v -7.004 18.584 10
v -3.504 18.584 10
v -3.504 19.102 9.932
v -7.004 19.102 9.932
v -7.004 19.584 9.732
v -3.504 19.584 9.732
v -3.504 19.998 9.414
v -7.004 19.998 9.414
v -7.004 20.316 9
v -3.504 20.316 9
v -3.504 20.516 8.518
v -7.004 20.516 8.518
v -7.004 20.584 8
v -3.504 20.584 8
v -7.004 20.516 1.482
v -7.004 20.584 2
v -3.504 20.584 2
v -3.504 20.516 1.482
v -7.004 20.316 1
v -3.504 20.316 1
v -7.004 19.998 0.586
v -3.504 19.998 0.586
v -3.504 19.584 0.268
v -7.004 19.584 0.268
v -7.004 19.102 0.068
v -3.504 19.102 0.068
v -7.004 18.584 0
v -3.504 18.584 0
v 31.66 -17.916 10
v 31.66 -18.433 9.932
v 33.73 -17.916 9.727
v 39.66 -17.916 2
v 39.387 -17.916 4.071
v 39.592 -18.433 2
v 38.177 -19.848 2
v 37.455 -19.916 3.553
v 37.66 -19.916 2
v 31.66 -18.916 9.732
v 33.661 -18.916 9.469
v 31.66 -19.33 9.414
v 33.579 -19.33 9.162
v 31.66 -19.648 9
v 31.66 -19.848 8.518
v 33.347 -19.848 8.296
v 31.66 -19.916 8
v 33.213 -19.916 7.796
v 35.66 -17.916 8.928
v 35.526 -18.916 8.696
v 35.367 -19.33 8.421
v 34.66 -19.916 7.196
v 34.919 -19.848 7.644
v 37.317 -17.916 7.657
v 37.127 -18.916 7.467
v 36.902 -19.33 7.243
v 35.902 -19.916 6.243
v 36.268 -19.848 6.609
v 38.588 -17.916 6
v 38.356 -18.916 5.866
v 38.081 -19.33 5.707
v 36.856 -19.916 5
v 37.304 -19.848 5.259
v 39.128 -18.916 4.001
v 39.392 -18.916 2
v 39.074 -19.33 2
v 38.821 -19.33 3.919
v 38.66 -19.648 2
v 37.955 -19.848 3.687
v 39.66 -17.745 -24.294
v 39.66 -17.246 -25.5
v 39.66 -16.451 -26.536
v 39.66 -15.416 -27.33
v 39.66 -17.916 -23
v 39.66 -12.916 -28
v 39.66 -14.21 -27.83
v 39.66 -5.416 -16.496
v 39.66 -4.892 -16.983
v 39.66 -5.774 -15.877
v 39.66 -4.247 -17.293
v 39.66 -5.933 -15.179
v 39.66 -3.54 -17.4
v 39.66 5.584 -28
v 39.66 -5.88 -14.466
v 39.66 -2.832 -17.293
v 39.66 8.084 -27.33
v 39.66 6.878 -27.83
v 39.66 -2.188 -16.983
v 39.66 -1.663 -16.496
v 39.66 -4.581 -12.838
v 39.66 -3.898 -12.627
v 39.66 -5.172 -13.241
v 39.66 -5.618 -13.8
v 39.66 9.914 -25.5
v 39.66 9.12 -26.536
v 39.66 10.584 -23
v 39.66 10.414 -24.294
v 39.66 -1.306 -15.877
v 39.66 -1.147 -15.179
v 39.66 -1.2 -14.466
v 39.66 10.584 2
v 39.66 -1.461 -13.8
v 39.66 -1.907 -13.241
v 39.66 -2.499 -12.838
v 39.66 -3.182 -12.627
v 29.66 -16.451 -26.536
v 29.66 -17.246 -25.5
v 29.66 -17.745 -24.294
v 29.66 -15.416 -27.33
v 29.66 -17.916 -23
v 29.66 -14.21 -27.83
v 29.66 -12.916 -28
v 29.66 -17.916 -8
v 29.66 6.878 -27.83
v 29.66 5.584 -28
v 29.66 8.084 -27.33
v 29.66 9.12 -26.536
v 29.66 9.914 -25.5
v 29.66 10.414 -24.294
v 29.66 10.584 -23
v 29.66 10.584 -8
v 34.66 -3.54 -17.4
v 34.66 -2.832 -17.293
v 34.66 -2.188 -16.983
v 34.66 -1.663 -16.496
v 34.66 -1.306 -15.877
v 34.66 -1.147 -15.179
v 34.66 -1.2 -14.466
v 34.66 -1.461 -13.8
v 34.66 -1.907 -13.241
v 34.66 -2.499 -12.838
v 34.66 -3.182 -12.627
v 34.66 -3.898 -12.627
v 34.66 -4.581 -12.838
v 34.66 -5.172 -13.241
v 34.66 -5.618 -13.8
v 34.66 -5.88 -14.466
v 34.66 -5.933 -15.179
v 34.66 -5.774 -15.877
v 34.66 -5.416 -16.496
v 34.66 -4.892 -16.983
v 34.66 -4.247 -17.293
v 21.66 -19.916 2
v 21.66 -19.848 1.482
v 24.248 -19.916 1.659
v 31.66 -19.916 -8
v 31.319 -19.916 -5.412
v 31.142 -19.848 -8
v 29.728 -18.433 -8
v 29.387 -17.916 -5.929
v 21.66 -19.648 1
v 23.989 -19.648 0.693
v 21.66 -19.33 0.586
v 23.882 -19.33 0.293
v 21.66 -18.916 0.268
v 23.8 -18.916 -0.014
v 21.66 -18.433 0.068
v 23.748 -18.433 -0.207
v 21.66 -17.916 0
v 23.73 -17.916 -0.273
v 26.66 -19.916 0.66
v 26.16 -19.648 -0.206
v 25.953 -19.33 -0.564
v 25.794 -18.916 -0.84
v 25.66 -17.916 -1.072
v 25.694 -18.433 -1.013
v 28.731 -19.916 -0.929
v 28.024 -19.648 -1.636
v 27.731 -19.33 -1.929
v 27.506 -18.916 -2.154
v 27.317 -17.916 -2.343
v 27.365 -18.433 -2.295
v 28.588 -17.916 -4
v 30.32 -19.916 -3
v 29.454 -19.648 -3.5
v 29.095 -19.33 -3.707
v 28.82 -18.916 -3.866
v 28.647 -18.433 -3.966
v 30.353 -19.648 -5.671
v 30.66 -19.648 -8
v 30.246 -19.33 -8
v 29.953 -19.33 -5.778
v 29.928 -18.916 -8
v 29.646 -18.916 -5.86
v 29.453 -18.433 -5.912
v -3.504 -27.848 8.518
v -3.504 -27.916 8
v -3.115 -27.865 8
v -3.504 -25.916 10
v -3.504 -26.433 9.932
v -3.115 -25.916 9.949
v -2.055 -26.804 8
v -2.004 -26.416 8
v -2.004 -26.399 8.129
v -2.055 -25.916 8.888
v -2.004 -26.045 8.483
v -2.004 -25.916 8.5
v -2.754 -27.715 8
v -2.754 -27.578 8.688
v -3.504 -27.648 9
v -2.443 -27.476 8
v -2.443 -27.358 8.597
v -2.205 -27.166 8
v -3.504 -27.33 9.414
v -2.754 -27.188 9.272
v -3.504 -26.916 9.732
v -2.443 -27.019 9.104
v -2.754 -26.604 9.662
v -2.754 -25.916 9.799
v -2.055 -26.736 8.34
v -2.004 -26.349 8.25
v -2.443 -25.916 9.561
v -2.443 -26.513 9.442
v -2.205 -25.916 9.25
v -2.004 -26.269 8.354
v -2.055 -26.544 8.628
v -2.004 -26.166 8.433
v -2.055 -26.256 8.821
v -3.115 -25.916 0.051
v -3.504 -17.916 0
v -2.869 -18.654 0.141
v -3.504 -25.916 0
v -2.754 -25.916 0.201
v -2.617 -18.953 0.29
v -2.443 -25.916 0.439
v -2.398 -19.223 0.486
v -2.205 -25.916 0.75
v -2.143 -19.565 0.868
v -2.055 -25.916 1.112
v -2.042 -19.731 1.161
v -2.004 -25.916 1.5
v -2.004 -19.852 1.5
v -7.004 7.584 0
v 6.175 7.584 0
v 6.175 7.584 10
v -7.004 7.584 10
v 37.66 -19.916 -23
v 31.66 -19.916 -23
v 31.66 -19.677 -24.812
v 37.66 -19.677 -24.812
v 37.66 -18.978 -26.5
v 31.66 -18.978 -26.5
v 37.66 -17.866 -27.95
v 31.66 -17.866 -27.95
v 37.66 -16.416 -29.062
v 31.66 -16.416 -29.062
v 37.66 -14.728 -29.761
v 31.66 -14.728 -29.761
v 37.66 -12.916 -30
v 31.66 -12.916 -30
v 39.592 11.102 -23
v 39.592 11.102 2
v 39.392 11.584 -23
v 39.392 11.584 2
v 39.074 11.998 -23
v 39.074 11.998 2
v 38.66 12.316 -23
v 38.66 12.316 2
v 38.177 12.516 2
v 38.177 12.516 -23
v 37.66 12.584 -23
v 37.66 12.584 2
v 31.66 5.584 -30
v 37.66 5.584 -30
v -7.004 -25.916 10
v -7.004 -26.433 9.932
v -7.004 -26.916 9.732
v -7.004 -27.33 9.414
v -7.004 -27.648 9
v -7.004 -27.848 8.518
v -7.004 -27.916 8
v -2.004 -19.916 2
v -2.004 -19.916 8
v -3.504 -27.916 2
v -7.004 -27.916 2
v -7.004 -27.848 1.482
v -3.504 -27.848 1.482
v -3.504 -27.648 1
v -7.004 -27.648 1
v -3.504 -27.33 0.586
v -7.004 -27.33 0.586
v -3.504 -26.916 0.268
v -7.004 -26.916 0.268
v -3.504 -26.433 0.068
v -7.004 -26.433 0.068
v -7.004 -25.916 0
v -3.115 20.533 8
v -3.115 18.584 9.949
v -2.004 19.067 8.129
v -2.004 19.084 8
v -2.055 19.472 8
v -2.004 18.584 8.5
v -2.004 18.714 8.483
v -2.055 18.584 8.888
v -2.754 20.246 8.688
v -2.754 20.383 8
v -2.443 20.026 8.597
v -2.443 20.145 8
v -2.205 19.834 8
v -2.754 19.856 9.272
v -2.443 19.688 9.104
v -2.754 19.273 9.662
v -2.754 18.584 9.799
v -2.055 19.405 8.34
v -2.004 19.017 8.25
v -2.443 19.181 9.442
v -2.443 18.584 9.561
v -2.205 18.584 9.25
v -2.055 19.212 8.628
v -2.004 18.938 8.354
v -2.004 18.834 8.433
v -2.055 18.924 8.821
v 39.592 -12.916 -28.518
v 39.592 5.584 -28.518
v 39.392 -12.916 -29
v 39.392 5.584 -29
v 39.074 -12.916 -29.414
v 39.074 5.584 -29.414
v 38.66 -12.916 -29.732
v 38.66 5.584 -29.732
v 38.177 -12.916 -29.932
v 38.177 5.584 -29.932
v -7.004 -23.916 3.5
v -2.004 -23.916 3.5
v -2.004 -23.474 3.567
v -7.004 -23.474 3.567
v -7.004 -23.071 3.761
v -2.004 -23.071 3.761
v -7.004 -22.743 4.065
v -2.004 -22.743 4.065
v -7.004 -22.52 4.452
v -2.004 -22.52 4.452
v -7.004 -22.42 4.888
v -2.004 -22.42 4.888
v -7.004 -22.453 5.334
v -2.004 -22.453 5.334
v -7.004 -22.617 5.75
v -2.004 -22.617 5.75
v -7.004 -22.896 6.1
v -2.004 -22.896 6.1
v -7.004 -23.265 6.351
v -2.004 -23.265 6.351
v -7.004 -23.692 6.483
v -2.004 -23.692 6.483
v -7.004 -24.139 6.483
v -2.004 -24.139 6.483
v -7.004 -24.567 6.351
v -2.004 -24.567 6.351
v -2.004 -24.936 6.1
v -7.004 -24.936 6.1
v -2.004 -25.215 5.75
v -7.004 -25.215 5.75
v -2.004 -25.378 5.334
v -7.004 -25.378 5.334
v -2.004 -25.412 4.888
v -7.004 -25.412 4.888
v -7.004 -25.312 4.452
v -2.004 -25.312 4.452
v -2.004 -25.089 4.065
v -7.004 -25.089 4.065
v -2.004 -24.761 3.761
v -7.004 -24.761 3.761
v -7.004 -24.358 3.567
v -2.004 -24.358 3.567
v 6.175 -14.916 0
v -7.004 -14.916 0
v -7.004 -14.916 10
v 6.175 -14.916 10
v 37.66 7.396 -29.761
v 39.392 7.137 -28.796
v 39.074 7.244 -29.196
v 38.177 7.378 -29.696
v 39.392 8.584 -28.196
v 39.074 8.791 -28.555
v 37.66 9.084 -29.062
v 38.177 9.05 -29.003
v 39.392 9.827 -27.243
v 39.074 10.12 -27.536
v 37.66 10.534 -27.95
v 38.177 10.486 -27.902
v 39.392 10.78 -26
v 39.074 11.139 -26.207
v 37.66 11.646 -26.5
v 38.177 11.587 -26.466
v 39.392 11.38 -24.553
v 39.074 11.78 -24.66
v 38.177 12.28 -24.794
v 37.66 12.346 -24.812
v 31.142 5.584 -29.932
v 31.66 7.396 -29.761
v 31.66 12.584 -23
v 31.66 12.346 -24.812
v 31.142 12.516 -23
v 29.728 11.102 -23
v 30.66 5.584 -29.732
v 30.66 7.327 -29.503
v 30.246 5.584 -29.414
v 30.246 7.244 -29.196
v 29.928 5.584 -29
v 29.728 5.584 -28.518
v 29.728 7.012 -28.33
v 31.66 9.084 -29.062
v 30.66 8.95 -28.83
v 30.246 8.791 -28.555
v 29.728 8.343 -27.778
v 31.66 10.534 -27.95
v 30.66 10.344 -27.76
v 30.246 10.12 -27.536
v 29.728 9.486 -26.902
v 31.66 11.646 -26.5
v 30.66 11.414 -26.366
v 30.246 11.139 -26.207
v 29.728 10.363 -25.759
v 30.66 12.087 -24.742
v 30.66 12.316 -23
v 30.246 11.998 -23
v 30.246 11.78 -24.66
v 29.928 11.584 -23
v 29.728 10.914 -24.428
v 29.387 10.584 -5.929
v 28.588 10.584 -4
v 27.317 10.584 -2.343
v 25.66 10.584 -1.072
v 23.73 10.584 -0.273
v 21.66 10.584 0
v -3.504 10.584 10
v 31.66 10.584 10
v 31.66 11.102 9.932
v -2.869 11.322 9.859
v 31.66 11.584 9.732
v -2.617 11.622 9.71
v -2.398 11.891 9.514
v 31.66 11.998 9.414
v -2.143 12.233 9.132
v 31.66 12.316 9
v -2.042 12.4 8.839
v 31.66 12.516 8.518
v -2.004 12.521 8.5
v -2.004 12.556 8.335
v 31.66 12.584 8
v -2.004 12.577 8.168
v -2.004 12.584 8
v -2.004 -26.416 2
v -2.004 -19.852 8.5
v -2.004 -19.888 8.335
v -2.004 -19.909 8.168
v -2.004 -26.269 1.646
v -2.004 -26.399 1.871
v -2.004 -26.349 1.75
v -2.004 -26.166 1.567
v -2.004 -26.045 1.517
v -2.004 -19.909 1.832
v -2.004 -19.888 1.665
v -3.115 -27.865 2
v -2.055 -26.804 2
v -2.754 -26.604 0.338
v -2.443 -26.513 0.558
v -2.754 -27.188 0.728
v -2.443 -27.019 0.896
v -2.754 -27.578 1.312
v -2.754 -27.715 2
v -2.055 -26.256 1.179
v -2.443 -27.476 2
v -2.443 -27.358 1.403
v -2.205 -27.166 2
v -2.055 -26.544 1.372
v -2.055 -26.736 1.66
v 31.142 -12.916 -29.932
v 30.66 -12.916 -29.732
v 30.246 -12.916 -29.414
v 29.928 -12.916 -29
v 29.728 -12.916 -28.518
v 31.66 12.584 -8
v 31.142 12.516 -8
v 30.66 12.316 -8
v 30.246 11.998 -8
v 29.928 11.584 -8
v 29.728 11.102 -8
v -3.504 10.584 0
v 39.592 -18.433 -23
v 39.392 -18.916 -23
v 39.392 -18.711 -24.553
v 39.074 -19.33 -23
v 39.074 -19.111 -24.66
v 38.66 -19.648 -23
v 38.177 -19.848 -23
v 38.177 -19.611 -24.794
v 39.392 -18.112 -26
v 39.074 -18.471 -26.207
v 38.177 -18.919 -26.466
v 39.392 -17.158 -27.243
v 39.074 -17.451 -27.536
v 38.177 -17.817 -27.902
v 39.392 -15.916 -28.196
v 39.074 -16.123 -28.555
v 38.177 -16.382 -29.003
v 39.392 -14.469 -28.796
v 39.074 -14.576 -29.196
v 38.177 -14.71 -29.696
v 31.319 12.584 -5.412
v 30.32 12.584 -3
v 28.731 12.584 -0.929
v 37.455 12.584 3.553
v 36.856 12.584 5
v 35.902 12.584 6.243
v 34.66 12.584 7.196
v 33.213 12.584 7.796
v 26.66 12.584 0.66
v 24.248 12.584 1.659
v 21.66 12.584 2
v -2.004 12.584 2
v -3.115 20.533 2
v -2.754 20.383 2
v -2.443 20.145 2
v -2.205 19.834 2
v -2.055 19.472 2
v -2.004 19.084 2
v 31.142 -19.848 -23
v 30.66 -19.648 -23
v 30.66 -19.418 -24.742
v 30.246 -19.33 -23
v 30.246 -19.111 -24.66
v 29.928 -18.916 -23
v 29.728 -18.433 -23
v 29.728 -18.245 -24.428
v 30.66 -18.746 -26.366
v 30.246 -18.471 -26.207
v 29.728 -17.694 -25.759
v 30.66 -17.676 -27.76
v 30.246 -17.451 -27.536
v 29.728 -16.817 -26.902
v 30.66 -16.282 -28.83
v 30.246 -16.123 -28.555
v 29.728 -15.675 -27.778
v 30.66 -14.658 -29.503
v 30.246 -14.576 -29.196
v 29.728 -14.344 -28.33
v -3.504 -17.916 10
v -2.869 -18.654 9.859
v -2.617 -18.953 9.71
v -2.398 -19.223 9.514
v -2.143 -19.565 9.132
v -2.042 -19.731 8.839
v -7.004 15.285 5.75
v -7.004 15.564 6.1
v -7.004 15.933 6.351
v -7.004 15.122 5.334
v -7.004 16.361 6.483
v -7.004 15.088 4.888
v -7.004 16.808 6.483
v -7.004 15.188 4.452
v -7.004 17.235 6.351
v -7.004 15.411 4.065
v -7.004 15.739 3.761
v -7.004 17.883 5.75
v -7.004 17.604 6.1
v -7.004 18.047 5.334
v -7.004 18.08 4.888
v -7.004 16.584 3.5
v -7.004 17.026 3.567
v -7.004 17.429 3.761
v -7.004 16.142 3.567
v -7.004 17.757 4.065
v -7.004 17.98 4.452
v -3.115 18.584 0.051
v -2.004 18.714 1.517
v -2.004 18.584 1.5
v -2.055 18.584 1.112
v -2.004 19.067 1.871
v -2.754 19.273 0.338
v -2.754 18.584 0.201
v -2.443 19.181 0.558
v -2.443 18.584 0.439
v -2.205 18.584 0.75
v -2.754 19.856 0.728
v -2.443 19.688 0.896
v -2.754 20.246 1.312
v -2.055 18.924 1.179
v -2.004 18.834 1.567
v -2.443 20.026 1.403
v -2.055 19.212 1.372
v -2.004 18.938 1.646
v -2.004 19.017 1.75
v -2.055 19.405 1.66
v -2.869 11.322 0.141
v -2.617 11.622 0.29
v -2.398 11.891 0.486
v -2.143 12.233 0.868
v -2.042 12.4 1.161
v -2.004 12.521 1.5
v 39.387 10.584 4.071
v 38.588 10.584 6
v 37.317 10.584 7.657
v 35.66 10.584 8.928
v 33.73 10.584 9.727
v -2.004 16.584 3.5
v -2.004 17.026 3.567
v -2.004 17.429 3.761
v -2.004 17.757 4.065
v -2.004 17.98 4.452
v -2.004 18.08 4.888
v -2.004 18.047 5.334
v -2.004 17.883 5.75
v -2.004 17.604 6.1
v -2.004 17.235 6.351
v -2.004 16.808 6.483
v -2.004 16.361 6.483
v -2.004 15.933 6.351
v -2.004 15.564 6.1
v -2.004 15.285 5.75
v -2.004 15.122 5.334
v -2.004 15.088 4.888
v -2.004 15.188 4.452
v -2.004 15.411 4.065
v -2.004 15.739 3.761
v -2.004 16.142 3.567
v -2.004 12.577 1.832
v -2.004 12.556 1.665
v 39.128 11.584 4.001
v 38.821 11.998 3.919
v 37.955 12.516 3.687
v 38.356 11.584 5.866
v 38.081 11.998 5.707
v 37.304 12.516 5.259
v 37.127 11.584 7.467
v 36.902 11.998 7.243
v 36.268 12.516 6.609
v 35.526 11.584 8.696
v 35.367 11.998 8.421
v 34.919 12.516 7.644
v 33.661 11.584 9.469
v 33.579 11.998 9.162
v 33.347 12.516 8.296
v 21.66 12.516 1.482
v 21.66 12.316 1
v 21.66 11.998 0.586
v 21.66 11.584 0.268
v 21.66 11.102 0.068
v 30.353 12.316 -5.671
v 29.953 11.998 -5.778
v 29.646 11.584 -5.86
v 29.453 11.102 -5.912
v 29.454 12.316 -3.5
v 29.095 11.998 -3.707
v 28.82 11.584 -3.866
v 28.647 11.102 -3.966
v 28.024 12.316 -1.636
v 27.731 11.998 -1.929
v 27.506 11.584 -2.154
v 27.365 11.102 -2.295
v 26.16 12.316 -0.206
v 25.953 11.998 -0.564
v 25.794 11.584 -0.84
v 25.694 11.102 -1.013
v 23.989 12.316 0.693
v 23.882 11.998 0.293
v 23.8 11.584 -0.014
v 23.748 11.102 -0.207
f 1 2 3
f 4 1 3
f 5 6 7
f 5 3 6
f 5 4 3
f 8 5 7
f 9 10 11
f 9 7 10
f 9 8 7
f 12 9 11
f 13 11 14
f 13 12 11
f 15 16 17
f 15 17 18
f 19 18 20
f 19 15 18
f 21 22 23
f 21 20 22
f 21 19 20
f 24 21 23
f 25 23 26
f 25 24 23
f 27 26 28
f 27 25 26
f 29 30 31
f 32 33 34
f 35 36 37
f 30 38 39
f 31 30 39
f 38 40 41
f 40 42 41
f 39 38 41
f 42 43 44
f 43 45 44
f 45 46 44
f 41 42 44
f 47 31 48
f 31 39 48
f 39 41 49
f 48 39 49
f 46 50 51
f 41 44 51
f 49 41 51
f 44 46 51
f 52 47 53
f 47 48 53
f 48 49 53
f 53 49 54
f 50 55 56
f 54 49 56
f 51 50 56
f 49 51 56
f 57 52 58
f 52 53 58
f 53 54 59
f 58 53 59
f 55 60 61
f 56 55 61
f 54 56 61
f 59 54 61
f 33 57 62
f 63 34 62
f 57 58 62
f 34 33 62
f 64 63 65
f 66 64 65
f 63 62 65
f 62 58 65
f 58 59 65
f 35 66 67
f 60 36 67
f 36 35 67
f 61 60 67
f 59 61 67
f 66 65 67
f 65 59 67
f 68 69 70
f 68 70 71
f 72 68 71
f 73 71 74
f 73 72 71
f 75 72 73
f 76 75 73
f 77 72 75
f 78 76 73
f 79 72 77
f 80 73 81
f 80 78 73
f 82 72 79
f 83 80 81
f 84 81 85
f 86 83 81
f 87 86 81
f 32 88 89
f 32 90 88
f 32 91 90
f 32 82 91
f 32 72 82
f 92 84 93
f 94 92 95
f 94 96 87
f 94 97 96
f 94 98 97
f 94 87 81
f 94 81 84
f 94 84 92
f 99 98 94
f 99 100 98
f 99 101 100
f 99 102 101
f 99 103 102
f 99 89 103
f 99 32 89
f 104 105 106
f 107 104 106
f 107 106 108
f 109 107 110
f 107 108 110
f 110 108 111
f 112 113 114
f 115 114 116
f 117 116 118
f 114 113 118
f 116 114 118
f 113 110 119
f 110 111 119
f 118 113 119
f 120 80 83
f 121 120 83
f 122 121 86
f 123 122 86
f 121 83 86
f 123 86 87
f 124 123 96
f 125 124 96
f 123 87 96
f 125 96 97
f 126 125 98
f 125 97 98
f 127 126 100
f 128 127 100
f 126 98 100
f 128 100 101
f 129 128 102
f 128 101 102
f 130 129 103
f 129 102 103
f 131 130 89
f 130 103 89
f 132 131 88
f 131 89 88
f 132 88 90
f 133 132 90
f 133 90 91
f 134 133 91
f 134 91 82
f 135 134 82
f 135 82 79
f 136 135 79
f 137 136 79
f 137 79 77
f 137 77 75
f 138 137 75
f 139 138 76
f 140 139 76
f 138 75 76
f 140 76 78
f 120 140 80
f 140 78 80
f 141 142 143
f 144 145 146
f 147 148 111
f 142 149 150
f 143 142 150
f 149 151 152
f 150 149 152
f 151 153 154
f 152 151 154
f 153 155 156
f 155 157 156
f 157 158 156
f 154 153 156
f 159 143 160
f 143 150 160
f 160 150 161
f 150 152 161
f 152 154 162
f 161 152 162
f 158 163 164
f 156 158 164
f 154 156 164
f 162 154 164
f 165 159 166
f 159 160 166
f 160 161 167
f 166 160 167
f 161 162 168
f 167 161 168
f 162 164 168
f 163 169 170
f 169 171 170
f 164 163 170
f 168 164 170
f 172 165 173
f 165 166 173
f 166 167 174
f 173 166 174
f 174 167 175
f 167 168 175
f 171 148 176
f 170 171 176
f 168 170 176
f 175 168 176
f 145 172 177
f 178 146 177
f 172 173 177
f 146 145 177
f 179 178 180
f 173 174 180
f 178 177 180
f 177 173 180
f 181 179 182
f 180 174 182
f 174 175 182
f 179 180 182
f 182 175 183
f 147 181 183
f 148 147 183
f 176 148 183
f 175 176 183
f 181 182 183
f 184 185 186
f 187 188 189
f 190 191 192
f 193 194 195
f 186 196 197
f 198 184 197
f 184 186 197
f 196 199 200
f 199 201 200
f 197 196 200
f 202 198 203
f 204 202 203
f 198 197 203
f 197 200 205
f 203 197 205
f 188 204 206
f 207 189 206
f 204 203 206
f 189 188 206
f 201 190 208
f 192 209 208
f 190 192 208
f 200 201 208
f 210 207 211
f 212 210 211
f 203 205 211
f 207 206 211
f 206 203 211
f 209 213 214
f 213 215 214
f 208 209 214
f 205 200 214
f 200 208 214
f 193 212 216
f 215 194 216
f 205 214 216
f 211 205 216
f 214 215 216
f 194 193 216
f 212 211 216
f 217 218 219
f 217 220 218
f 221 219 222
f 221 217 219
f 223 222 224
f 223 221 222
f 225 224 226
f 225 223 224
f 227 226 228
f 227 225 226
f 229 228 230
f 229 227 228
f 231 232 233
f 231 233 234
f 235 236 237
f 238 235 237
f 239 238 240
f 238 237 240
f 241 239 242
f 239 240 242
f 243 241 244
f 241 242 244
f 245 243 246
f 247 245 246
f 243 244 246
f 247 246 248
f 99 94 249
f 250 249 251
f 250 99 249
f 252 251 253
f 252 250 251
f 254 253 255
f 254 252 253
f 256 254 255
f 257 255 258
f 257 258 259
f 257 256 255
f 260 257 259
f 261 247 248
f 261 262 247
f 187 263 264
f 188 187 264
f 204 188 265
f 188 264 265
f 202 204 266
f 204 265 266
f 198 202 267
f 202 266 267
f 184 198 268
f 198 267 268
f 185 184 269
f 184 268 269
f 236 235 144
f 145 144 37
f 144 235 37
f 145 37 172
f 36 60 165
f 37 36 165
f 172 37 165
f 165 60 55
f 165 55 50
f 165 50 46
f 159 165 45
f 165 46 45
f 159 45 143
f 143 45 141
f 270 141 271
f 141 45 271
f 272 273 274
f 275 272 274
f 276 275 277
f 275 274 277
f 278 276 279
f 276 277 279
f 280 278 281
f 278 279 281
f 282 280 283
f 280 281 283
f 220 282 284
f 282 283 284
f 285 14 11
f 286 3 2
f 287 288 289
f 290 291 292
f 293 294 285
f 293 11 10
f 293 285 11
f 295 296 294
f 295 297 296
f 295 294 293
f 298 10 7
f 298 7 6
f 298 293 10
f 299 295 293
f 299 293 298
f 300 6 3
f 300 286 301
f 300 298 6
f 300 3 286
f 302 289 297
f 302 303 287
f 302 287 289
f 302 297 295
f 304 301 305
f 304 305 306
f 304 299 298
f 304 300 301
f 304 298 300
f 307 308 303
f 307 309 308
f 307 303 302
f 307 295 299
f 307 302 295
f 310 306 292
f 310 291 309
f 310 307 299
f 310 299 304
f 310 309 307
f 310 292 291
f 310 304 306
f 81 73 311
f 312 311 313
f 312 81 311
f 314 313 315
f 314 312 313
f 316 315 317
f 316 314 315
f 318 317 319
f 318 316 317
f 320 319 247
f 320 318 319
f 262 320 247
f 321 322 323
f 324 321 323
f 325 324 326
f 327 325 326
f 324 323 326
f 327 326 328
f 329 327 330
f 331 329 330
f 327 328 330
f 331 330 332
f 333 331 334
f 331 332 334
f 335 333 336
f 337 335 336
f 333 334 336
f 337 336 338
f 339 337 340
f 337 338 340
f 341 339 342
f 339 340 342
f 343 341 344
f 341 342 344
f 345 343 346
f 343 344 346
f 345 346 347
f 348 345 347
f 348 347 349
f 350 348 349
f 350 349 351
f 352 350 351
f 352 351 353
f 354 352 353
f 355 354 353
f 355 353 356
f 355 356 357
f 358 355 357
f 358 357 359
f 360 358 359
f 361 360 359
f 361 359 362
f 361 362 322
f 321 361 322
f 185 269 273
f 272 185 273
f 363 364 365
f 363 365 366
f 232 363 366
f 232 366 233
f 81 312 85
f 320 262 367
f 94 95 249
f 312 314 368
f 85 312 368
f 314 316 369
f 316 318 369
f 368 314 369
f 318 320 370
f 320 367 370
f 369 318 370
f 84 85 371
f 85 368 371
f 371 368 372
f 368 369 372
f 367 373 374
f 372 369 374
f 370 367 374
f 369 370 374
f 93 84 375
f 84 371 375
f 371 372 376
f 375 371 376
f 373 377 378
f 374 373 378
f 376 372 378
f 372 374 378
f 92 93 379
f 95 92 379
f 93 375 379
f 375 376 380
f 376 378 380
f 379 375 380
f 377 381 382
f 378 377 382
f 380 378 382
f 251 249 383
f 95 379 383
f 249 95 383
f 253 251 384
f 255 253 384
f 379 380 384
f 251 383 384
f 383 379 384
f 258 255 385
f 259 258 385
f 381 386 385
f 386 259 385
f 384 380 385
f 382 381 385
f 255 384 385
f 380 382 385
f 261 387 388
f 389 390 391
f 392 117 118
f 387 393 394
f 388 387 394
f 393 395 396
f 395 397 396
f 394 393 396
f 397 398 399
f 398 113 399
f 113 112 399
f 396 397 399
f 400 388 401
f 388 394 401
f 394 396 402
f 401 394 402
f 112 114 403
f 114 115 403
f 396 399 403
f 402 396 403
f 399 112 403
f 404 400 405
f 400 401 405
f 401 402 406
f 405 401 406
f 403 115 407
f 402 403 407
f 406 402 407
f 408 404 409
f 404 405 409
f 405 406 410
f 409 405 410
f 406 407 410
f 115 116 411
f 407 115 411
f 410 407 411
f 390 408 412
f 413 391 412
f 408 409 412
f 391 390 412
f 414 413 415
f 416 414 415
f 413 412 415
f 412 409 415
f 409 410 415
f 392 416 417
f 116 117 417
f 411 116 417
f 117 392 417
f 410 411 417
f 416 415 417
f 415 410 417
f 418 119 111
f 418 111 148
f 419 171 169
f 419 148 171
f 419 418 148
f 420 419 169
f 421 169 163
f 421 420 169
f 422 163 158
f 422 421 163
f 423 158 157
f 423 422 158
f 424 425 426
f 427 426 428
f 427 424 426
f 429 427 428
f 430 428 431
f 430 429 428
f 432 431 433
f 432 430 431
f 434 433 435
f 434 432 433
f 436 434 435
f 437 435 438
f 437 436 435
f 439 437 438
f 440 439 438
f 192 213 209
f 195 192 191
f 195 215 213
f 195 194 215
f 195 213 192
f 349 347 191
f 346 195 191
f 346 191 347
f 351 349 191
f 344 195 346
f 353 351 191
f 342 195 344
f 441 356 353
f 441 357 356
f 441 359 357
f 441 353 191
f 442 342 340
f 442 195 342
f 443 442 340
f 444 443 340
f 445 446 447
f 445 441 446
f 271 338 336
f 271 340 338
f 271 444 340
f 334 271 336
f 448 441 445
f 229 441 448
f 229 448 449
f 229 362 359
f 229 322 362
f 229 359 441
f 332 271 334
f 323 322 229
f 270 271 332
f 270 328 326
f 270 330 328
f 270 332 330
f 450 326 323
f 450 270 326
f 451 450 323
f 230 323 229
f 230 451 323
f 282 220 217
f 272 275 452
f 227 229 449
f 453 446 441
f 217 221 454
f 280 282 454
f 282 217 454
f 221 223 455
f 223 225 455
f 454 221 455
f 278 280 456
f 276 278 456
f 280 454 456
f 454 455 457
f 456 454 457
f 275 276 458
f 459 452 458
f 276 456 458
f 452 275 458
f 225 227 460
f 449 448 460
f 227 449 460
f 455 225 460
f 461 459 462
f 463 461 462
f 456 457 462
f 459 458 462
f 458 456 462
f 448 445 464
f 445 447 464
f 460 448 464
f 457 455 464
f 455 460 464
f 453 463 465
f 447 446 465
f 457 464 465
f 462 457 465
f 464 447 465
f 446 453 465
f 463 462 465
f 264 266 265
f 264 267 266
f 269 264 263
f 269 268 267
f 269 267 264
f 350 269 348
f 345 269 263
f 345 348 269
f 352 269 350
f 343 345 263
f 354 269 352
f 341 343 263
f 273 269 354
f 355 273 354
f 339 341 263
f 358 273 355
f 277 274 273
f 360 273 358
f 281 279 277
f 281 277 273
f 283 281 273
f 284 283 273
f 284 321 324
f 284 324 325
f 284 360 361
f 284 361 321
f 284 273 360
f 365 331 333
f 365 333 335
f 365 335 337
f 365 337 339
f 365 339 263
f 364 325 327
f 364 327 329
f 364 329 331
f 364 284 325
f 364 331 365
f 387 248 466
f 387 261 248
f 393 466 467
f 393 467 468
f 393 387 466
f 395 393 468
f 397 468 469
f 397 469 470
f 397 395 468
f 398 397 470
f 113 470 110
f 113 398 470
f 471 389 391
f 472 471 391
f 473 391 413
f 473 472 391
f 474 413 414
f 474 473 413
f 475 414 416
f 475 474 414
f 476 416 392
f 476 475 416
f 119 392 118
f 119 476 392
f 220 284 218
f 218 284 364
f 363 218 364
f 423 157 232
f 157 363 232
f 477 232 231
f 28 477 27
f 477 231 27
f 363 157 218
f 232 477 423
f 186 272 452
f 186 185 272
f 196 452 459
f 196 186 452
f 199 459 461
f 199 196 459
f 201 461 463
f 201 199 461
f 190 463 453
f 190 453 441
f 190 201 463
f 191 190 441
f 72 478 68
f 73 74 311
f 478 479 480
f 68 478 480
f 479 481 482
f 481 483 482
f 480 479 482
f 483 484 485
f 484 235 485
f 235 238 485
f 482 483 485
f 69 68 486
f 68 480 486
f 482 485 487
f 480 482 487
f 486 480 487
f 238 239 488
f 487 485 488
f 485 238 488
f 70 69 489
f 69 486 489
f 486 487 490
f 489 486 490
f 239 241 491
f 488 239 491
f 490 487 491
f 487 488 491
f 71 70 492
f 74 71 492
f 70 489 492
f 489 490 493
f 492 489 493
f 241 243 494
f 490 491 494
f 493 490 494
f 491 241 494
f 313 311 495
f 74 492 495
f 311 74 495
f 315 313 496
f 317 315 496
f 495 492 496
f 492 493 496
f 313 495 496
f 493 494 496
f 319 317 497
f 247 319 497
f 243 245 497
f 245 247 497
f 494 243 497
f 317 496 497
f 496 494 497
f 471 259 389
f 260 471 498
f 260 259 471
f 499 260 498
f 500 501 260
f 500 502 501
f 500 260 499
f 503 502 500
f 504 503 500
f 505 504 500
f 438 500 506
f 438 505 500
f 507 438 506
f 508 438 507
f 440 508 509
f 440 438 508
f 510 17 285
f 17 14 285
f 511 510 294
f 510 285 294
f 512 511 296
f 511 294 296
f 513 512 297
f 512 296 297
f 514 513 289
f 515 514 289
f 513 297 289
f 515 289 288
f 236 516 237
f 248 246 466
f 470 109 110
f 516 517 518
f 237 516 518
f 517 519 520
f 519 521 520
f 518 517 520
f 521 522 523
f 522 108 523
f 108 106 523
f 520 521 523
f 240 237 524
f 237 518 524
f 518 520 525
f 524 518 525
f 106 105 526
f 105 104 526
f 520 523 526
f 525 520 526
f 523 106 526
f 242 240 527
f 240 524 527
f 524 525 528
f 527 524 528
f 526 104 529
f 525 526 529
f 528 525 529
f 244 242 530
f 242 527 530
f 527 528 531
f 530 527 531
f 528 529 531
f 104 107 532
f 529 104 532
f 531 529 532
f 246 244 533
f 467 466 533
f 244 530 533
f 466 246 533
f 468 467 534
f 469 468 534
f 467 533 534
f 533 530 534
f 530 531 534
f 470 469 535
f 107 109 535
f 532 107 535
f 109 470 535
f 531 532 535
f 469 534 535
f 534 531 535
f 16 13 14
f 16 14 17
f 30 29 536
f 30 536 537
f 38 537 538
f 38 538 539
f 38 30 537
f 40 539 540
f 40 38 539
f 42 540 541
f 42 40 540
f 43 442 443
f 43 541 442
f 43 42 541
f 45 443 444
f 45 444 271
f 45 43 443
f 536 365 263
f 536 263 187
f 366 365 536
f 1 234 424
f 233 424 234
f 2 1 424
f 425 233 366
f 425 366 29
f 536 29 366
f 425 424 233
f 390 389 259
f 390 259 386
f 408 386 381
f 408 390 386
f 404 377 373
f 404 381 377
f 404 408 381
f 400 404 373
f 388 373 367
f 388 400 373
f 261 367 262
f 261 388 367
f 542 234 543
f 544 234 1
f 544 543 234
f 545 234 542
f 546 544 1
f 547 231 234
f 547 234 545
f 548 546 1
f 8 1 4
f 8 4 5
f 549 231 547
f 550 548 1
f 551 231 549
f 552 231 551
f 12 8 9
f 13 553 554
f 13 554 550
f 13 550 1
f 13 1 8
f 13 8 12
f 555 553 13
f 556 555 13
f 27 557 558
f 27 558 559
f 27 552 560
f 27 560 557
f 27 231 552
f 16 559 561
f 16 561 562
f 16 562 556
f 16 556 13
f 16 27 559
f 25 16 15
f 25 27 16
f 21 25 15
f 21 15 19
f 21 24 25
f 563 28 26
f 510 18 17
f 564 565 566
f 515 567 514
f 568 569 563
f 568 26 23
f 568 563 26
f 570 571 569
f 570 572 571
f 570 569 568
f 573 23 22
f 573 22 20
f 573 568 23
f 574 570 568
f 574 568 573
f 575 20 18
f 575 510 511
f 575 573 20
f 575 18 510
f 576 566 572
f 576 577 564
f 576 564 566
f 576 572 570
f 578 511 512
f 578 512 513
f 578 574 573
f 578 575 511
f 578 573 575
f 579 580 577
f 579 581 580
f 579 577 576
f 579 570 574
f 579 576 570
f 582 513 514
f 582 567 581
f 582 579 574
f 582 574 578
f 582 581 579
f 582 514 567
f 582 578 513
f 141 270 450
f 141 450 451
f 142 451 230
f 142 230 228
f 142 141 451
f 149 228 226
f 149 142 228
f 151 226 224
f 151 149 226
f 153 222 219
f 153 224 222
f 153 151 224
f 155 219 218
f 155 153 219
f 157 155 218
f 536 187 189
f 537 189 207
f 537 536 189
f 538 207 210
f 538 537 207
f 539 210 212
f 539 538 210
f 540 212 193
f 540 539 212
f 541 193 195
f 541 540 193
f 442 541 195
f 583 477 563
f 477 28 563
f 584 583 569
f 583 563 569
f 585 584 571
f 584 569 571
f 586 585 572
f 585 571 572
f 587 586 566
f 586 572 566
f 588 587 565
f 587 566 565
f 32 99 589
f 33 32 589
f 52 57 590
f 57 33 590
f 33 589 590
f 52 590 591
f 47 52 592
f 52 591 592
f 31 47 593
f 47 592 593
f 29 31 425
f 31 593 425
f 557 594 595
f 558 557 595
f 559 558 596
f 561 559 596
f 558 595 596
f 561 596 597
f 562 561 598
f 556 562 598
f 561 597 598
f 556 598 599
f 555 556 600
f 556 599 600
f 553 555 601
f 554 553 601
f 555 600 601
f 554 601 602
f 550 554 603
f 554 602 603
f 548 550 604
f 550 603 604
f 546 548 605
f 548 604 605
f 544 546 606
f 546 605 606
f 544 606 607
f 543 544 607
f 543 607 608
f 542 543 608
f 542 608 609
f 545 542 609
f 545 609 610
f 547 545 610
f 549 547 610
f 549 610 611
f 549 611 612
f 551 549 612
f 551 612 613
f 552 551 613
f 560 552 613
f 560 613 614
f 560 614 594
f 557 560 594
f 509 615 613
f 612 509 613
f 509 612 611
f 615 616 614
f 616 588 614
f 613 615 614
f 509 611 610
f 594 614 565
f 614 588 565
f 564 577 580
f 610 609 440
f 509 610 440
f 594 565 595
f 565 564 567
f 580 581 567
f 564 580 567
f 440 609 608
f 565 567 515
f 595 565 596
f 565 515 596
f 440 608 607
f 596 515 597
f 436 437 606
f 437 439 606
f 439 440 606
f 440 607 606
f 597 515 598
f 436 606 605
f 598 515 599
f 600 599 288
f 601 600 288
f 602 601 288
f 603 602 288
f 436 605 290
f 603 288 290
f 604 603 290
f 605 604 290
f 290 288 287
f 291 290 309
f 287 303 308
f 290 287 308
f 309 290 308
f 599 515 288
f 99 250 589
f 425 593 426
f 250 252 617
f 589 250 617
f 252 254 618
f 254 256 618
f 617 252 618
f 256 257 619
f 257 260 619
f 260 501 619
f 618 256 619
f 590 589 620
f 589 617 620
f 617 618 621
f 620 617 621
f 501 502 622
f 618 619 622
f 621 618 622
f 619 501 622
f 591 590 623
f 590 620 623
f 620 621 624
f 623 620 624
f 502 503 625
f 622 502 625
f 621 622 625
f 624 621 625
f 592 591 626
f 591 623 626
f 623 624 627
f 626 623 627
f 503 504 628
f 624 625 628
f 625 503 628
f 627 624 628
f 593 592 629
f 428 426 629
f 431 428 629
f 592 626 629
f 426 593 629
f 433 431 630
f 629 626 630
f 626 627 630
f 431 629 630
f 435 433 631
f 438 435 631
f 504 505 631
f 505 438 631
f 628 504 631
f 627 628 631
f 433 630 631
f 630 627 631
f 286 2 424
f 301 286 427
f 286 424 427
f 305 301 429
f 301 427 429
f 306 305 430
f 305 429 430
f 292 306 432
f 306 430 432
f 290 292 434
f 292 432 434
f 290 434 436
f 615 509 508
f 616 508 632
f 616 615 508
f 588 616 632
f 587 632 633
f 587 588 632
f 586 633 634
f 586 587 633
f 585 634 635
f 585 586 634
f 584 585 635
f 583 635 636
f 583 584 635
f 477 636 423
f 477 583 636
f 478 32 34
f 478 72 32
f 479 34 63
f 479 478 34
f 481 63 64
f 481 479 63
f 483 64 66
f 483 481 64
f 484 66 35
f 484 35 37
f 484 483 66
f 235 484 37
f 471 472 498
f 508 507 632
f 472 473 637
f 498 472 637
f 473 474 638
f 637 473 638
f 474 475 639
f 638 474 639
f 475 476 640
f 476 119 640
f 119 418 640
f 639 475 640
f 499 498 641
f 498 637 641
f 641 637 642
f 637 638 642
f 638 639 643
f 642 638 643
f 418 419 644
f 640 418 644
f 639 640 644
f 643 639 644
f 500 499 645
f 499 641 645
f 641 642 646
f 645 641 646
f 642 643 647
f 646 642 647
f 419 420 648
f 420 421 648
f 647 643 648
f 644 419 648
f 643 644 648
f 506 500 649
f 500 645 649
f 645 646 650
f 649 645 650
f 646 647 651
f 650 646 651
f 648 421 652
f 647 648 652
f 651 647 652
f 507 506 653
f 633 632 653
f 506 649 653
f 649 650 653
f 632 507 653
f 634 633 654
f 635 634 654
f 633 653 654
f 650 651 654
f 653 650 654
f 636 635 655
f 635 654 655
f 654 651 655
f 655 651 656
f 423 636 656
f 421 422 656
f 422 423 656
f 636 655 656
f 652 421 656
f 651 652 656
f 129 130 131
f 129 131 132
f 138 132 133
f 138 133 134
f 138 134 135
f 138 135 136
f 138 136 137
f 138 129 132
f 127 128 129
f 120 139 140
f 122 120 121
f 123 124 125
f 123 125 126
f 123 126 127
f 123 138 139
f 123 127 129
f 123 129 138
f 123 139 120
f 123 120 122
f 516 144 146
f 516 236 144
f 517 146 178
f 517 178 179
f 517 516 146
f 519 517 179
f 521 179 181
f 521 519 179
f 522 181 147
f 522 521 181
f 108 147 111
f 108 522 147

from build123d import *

# Parameters (mm, degrees)
BOSS_EXTRUDE1_DEPTH = 15
SKETCH2_W           = 15
SKETCH2_H           = 32.5
BOSS_EXTRUDE2_DEPTH = 30
SKETCH3_W           = 10
SKETCH3_H           = 32.5
BOSS_EXTRUDE3_DEPTH = 30
SKETCH4_R           = 2.4
CUT_EXTRUDE1_DEPTH  = 5
CUT_EXTRUDE2_DEPTH  = 5
FILLET1_R           = 7
FILLET2_R           = 8
BOSS_EXTRUDE4_DEPTH = 5
SKETCH7_R           = 1.5
CUT_EXTRUDE3_DEPTH  = 6
FILLET3_R           = 2
FILLET4_R           = 1.5


with BuildPart() as part:
    # Sketch1 → Boss-Extrude1 (new body)
    with BuildSketch(Plane.XY):
        Polygon((-7.003618791, -14.915819089), (6.175, -14.915819089), (6.175, 7.584180911), (-7.003618791, 7.584180911), (-7.003618791, 12.584180911), (9.659757463, 12.584180911), (9.659757463, -19.915819089), (-7.003618791, -19.915819089), align=None)
    extrude(amount=BOSS_EXTRUDE1_DEPTH)

    # Sketch2 → Boss-Extrude2 (add)
    with BuildSketch(Plane(origin=(9.659757463, 0, 0), x_dir=(0, 0, -1), z_dir=(1, 0, 0))):
        with Locations((-7.5, -3.665819089)):
            Rectangle(SKETCH2_W, SKETCH2_H)
    extrude(amount=BOSS_EXTRUDE2_DEPTH)

    # Sketch3 → Boss-Extrude3 (add)
    with BuildSketch(Plane(origin=(0, 0, 0), x_dir=(-1, 0, 0), z_dir=(0, 0, -1))):
        with Locations((-34.659757463, -3.665819089)):
            Rectangle(SKETCH3_W, SKETCH3_H)
    extrude(amount=BOSS_EXTRUDE3_DEPTH)

    # Sketch4 → Cut-Extrude1 (cut)
    with BuildSketch(Plane(origin=(39.659757463, 0, 0), x_dir=(0, 0, -1), z_dir=(1, 0, 0))):
        with Locations((15, -3.53982496)):
            Circle(SKETCH4_R)
    extrude(amount=-CUT_EXTRUDE1_DEPTH, mode=Mode.SUBTRACT)

    # Sketch5 → Cut-Extrude2 (cut)
    with BuildSketch(Plane.XY.offset(15)):
        Polygon((39.659757463, 12.584180911), (-7.003618791, 12.584180911), (-7.003618791, 7.584180911), (6.175, 7.584180911), (6.175, -14.915819089), (-7.003618791, -14.915819089), (-7.003618791, -19.915819089), (39.659757463, -19.915819089), align=None)
    extrude(amount=-CUT_EXTRUDE2_DEPTH, mode=Mode.SUBTRACT)

    # Fillet1
    fillet1_edges = [part.edges().sort_by_distance(p)[0] for p in [
        (34.659757463, -19.915819089, -30),
        (34.659757463, 12.584180911, -30),
    ]]
    fillet(fillet1_edges, radius=FILLET1_R)

    # Fillet2
    fillet2_edges = [part.edges().sort_by_distance(p)[0] for p in [
        (29.659757463, -3.665819089, 0),
        (39.659757463, -3.665819089, 10),
    ]]
    fillet(fillet2_edges, radius=FILLET2_R)

    # Sketch6 → Boss-Extrude4 (add)
    with BuildSketch(Plane.ZY.offset(7.003618791)):
        with BuildLine():
            Line((0, 7.584180911), (10, 7.584180911))
            Line((10, 7.584180911), (10, 18.584180911))
            ThreePointArc((10, 18.584180911), (9.414213562, 19.998394474), (8, 20.584180911))
            Line((8, 20.584180911), (2, 20.584180911))
            ThreePointArc((2, 20.584180911), (0.585786438, 19.998394474), (0, 18.584180911))
            Line((0, 18.584180911), (0, 7.584180911))
        make_face()
        with BuildLine():
            Line((10, -14.915819089), (10, -25.915819089))
            ThreePointArc((10, -25.915819089), (9.414213562, -27.330032651), (8, -27.915819089))
            Line((8, -27.915819089), (2, -27.915819089))
            ThreePointArc((2, -27.915819089), (0.585786438, -27.330032651), (0, -25.915819089))
            Line((0, -25.915819089), (0, -14.915819089))
            Line((0, -14.915819089), (10, -14.915819089))
        make_face()
    extrude(amount=-BOSS_EXTRUDE4_DEPTH)

    # Sketch7 → Cut-Extrude3 (cut, through all)
    with BuildSketch(Plane(origin=(-2.003618791, 0, 0), x_dir=(0, 0, -1), z_dir=(1, 0, 0))):
        with Locations((-5, -23.915819089)):
            Circle(SKETCH7_R)
        with Locations((-5, 16.584180911)):
            Circle(SKETCH7_R)
    extrude(amount=-CUT_EXTRUDE3_DEPTH, mode=Mode.SUBTRACT)

    # Fillet3
    fillet3_edges = [part.edges().sort_by_distance(p)[0] for p in [
        (14.828069336, 12.584180911, 10),
        (9.828069336, 12.584180911, 0),
        (37.316611713, 12.584180911, 7.656854249),
        (39.659757463, -19.915819089, -10.5),
        (37.316611713, -19.915819089, 7.656854249),
        (27.316611713, 12.584180911, -2.343145751),
        (27.316611713, -19.915819089, -2.343145751),
        (14.828069336, -19.915819089, 10),
        (9.828069336, -19.915819089, 0),
        (39.659757463, -3.665819089, -30),
        (29.659757463, -3.665819089, -30),
        (39.659757463, 12.584180911, -10.5),
        (39.659757463, -17.865566557, -27.949747468),
        (39.659757463, 10.53392838, -27.949747468),
        (29.659757463, 12.584180911, -15.5),
        (29.659757463, -19.915819089, -15.5),
        (29.659757463, -17.865566557, -27.949747468),
        (29.659757463, 10.53392838, -27.949747468),
    ]]
    fillet(fillet3_edges, radius=FILLET3_R)

    # Fillet4
    fillet4_edges = [part.edges().sort_by_distance(p)[0] for p in [
        (-2.003618791, 15.584180911, 0),
        (-2.003618791, 15.584180911, 10),
        (-2.003618791, 19.998394474, 0.585786438),
        (-2.003618791, 20.584180911, 5),
        (-2.003618791, 19.998394474, 9.414213562),
        (-2.003618791, -22.915819089, 10),
        (-2.003618791, -22.915819089, 0),
        (-2.003618791, -27.330032651, 9.414213562),
        (-2.003618791, -27.915819089, 5),
        (-2.003618791, -27.330032651, 0.585786438),
    ]]
    fillet(fillet4_edges, radius=FILLET4_R)


solid = part.part
